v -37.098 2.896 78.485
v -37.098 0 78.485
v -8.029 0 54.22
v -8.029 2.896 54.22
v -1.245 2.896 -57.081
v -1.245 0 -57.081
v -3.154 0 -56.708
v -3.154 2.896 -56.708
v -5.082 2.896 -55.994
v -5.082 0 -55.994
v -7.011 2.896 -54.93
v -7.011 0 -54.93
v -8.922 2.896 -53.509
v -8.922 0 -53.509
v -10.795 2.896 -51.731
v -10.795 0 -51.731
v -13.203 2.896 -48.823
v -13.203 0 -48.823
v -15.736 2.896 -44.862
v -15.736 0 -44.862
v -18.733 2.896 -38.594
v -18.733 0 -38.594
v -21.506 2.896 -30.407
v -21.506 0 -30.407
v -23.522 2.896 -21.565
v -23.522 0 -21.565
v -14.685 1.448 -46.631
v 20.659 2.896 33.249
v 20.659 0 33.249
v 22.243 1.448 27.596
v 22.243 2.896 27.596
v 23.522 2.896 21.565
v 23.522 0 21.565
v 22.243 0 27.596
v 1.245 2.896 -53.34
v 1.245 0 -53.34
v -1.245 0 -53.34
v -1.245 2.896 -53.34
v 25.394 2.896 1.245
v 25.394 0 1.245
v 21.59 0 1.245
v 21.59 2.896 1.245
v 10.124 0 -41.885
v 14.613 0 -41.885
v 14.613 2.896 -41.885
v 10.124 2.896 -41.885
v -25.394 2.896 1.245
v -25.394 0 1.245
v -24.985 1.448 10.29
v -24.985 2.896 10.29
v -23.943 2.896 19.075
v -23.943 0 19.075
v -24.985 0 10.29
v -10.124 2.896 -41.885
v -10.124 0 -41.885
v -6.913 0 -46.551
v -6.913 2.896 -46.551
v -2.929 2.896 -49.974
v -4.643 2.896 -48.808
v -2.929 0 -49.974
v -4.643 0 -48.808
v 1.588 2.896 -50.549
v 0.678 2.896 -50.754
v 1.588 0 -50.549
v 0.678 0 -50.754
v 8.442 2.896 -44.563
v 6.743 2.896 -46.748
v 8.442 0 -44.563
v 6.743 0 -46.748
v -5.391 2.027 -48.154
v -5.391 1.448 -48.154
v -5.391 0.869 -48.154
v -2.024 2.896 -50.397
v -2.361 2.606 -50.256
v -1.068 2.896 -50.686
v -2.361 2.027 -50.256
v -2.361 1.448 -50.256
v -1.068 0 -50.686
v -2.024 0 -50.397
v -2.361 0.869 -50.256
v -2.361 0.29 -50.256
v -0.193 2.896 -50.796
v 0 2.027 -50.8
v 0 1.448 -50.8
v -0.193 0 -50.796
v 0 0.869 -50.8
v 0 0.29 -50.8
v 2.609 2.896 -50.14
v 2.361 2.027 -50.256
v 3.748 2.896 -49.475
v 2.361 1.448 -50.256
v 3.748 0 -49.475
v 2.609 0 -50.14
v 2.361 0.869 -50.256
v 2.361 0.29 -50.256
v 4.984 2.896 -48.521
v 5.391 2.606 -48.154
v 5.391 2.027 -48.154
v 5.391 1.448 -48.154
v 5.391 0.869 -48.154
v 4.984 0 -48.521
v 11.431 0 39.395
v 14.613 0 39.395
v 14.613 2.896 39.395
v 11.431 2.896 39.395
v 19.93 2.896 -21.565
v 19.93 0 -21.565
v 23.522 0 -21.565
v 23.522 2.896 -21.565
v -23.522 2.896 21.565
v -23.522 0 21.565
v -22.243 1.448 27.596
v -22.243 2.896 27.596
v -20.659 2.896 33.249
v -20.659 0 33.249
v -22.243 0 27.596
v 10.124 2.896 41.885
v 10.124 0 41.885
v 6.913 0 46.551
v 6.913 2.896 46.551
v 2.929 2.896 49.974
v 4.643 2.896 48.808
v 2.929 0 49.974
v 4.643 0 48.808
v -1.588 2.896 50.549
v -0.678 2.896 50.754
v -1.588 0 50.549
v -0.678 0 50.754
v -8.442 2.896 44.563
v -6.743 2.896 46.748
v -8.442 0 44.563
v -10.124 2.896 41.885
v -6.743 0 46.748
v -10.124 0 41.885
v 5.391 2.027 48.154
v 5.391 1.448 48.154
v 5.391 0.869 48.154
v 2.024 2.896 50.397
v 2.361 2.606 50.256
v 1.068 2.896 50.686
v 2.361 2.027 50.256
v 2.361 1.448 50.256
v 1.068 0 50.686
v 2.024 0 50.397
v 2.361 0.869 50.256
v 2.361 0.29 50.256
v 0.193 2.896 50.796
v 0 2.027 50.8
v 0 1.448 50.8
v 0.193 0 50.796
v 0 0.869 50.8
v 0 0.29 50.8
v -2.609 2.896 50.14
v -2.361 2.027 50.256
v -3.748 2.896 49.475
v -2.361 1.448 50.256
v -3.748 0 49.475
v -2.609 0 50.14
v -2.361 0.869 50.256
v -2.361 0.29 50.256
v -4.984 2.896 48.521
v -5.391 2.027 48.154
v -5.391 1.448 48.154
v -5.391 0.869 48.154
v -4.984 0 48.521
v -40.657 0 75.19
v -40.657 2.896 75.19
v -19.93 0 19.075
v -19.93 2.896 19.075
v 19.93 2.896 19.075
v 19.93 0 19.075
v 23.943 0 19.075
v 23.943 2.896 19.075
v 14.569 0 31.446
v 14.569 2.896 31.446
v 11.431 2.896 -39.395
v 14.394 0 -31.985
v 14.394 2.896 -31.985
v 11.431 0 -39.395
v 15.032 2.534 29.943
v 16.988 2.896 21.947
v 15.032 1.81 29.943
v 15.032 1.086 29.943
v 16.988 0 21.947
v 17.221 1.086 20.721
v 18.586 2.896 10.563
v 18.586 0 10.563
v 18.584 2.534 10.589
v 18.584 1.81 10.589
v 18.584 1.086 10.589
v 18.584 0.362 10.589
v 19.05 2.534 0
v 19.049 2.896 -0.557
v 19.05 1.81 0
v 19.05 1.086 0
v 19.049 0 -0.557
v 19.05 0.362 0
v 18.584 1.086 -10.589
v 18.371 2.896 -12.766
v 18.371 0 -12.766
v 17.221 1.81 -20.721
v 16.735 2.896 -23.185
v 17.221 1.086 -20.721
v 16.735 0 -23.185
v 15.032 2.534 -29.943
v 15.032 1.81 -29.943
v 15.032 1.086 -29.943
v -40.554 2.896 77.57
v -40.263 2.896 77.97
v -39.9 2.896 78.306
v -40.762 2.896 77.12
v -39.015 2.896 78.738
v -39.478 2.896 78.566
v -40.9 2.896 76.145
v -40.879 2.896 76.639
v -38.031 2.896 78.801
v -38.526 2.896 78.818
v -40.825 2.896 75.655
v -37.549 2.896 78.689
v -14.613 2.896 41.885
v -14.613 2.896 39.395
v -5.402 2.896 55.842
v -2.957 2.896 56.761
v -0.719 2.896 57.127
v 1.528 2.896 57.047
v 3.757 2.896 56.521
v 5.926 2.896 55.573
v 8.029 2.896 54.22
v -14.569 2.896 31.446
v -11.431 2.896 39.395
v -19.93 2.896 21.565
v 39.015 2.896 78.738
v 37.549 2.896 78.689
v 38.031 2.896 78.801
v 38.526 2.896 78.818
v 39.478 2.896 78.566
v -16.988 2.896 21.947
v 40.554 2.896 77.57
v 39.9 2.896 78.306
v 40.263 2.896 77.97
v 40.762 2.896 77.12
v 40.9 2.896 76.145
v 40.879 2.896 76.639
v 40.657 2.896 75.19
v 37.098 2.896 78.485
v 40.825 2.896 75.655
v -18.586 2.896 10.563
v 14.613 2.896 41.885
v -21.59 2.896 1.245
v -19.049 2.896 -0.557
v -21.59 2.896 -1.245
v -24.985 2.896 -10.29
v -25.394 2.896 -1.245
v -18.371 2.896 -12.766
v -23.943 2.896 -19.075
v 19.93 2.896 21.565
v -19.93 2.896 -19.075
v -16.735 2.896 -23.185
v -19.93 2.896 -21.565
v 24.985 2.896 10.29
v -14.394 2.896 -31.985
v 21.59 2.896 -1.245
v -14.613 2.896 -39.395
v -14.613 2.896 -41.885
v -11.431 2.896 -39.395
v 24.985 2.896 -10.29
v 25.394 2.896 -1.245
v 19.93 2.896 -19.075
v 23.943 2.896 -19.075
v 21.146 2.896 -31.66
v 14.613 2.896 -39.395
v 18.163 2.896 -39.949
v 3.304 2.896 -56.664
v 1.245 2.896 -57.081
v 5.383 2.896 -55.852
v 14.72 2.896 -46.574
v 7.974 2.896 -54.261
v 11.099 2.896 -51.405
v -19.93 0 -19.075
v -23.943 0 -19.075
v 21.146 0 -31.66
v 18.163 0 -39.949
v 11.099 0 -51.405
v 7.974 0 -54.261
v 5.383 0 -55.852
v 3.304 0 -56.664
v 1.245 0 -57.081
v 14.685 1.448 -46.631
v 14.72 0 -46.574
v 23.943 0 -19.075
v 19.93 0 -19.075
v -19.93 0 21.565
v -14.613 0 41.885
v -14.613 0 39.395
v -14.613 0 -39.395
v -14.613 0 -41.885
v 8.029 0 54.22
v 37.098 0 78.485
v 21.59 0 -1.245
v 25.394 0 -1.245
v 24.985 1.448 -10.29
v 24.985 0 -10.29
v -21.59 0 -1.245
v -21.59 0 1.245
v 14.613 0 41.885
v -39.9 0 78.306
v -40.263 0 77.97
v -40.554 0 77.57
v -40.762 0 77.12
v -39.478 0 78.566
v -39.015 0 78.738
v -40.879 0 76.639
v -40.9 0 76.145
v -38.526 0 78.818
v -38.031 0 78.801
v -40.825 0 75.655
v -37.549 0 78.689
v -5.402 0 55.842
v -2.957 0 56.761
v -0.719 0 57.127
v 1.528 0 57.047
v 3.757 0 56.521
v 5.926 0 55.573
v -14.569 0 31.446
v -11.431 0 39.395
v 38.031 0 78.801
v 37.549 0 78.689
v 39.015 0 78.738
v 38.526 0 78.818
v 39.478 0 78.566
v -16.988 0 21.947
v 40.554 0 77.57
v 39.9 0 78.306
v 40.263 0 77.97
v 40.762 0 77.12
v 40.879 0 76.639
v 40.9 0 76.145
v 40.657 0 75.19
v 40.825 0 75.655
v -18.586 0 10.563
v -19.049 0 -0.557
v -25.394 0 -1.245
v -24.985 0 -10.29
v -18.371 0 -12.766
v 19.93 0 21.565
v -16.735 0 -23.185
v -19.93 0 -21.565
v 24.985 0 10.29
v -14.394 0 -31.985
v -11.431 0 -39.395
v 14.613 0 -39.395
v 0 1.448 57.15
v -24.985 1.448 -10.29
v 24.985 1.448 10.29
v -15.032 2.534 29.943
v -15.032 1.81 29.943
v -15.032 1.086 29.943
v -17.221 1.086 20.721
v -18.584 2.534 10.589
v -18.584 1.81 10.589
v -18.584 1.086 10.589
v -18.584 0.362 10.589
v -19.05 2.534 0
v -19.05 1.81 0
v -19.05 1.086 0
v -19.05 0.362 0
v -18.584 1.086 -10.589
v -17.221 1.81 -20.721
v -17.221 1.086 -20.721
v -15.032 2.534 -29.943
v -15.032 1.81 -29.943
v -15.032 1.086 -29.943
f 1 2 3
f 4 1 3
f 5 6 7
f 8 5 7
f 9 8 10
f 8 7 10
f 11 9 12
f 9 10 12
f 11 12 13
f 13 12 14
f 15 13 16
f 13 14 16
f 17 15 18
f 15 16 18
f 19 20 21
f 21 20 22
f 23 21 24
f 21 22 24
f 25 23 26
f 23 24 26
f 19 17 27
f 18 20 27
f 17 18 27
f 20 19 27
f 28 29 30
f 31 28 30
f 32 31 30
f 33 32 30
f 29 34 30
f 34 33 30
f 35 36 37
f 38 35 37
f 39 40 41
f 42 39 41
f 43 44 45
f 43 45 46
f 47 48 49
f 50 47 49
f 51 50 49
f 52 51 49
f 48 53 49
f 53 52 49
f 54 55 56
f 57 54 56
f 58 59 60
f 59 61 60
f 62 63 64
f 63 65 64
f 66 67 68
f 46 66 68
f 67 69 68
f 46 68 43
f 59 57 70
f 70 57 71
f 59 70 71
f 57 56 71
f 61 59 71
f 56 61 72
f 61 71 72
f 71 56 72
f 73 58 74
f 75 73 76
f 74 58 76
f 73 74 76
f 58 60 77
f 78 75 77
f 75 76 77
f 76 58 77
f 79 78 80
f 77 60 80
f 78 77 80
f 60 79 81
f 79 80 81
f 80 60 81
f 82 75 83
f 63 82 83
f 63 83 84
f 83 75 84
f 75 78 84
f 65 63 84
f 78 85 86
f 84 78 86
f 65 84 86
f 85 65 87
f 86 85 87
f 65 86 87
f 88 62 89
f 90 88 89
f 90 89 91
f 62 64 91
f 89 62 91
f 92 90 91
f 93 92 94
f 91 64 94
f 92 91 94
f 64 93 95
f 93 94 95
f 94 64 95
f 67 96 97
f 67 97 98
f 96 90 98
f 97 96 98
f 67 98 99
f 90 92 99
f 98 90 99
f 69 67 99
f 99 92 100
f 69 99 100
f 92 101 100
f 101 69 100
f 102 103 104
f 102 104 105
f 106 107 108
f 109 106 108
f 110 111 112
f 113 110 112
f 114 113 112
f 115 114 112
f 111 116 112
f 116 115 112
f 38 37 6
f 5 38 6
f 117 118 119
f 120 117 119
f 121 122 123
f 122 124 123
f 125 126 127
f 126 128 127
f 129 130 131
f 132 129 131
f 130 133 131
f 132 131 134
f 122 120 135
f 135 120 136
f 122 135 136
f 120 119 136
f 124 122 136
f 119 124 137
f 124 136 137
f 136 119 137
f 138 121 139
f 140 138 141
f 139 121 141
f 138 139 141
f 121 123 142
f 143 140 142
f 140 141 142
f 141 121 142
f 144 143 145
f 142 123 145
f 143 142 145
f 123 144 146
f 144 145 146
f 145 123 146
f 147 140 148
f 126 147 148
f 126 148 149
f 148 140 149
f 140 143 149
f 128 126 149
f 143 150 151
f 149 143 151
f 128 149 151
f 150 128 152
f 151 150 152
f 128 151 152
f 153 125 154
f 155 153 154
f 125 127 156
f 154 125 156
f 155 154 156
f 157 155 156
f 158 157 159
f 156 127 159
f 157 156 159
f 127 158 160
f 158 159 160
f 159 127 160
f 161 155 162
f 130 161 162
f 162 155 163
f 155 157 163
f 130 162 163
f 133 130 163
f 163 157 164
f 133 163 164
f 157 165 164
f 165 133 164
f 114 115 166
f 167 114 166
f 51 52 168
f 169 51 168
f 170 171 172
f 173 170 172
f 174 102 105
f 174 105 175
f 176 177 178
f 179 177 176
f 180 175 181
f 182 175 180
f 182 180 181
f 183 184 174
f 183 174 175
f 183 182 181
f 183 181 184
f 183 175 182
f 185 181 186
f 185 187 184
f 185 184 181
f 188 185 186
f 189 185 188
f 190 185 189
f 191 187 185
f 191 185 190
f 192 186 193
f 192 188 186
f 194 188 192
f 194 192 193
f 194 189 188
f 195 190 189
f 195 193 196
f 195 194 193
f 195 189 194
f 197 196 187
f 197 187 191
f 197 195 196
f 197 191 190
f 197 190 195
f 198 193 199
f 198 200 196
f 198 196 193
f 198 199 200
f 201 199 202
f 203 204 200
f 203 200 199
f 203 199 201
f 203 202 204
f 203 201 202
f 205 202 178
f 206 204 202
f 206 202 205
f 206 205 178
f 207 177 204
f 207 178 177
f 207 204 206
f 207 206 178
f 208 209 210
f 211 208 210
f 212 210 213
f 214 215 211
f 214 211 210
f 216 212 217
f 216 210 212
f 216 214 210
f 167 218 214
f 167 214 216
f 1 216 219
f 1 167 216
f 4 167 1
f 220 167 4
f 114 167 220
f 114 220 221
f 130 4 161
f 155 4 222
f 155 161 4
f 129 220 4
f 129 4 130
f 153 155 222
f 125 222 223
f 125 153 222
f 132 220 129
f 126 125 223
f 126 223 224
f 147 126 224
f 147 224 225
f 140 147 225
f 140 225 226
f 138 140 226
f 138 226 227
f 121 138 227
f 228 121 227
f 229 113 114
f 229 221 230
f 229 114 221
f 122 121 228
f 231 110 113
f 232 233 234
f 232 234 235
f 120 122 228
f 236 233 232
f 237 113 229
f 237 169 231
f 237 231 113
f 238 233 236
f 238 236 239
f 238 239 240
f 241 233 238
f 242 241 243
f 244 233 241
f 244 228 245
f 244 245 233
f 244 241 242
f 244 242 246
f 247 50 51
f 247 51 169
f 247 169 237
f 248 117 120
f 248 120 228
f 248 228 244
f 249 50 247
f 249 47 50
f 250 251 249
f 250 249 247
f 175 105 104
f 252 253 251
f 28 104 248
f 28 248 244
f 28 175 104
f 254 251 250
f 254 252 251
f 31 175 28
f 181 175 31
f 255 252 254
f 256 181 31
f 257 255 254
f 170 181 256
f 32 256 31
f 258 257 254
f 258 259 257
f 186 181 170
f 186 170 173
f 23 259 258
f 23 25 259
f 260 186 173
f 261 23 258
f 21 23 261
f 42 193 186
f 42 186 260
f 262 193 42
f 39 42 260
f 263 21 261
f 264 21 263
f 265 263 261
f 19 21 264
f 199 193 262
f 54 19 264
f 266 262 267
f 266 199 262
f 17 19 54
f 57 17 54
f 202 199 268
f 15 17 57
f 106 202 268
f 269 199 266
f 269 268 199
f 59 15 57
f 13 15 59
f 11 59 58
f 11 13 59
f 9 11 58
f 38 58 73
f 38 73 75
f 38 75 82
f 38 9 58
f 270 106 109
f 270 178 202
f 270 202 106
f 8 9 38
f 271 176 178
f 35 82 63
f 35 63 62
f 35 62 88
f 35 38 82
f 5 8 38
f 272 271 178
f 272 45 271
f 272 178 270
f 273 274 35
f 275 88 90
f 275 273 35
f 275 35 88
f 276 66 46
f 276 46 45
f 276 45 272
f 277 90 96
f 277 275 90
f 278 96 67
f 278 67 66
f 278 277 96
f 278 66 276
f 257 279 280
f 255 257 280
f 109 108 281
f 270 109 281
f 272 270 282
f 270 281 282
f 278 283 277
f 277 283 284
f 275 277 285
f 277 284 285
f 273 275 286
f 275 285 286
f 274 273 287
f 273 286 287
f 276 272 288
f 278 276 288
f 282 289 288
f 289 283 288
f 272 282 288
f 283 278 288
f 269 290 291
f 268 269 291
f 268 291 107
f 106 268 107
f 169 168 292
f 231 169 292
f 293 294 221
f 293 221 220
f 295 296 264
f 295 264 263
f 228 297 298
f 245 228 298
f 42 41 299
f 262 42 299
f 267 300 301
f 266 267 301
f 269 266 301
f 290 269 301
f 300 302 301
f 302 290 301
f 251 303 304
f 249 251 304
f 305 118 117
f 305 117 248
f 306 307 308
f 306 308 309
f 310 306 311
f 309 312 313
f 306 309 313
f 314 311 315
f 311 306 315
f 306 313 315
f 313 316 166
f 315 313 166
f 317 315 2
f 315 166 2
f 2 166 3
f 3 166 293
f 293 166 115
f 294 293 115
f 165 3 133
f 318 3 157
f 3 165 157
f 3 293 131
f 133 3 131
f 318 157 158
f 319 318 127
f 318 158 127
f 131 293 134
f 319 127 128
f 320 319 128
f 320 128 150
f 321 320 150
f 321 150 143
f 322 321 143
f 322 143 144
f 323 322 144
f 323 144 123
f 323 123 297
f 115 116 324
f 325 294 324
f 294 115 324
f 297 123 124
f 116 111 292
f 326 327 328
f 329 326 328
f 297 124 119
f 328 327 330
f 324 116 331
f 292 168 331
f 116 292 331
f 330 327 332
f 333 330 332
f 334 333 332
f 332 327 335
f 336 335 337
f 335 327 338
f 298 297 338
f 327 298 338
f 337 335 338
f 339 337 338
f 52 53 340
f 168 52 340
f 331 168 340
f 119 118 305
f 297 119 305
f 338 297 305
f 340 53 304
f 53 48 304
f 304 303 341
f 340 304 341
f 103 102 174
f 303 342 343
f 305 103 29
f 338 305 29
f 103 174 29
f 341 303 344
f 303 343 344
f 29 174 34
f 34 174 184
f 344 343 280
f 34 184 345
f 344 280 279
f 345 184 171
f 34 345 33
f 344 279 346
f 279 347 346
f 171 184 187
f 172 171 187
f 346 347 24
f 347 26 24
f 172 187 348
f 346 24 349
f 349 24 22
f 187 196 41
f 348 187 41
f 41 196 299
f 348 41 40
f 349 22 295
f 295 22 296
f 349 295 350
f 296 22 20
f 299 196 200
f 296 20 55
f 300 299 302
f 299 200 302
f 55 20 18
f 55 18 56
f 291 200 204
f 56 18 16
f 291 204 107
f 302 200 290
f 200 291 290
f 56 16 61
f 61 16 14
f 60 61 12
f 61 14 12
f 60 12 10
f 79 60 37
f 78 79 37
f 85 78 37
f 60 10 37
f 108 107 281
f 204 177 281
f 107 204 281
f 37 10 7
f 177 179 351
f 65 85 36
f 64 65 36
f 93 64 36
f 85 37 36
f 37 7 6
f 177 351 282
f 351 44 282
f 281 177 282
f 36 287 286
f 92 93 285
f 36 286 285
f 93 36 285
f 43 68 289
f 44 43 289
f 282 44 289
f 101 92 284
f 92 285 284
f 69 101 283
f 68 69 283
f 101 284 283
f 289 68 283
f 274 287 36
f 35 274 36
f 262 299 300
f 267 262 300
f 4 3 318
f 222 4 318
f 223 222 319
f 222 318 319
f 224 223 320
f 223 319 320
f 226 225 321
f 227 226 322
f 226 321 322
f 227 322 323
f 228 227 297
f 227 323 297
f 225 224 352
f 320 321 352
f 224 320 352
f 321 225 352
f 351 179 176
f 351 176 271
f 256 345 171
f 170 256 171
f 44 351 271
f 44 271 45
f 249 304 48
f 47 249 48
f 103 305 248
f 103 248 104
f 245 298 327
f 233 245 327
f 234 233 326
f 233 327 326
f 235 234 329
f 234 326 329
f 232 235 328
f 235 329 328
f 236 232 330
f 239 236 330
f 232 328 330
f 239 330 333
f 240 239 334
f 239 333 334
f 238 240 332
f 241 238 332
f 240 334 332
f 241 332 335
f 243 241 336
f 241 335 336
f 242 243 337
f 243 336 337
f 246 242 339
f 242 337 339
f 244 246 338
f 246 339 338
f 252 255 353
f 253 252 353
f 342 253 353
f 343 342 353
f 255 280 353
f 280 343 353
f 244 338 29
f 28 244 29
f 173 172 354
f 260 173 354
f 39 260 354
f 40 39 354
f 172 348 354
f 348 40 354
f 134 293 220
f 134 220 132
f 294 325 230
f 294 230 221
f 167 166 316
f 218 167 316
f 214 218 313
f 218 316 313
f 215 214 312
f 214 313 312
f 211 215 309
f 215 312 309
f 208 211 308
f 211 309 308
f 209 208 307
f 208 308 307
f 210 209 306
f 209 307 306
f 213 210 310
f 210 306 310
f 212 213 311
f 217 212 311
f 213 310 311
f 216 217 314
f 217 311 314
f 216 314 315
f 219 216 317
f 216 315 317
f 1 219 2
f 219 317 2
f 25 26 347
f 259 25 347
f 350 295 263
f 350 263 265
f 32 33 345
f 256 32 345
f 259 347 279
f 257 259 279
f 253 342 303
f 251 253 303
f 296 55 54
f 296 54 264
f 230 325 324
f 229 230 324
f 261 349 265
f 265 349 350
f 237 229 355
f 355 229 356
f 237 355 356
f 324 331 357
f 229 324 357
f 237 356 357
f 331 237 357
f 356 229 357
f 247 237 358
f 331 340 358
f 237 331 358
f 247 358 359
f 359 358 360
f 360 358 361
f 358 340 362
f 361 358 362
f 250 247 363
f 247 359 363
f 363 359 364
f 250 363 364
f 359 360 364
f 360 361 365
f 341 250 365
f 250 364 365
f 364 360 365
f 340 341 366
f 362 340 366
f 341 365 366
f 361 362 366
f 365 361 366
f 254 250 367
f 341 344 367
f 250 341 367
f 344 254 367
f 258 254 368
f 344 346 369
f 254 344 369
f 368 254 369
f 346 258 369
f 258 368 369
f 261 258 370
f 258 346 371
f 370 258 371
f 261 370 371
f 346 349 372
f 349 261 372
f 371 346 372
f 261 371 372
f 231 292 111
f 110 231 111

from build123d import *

# Parameters (mm, degrees)
BOSS_EXTRUDE2_DEPTH = 2.8956


with BuildPart() as part:
    # Sketch1 → Boss-Extrude2 (new body)
    with BuildSketch(Plane(origin=(0, 0, 0), x_dir=(1, 0, 0), z_dir=(0, 1, 0))):
        with BuildLine():
            Line((21.59, 1.2446), (25.393976036, 1.2446))
            add(Edge.make_bspline(
                [(25.393976036, 1.2446), (25.305125525, 10.422131382), (23.943355437, 19.0754)],
                knots=[4.73416848, 4.73416848, 4.73416848, 5.052697334, 5.052697334, 5.052697334], degree=2, weights=[1, 0.987344206, 1]))
            Line((23.943355437, 19.0754), (19.930240776, 19.0754))
            Line((19.930240776, 19.0754), (19.930240776, 21.5646))
            Line((19.930240776, 21.5646), (23.522368768, 21.5646))
            add(Edge.make_bspline(
                [(23.522368768, 21.5646), (17.413838434, 55.296547713), (1.2446, 57.081350193)],
                knots=[5.099304053, 5.099304053, 5.099304053, 6.234165678, 6.234165678, 6.234165678], degree=2, weights=[1, 0.843284611, 1]))
            Line((1.2446, 57.081350193), (1.2446, 53.34))
            Line((1.2446, 53.34), (-1.2446, 53.34))
            Line((-1.2446, 53.34), (-1.2446, 57.081350193))
            add(Edge.make_bspline(
                [(-1.2446, 57.081350193), (-17.413838434, 55.296547713), (-23.522368768, 21.5646)],
                knots=[0.049019629, 0.049019629, 0.049019629, 1.183881254, 1.183881254, 1.183881254], degree=2, weights=[1, 0.843284611, 1]))
            Line((-23.522368768, 21.5646), (-19.930240776, 21.5646))
            Line((-19.930240776, 21.5646), (-19.930240776, 19.0754))
            Line((-19.930240776, 19.0754), (-23.943355437, 19.0754))
            add(Edge.make_bspline(
                [(-23.943355437, 19.0754), (-25.305125525, 10.422131382), (-25.393976036, 1.2446)],
                knots=[1.230487974, 1.230487974, 1.230487974, 1.549016827, 1.549016827, 1.549016827], degree=2, weights=[1, 0.987344206, 1]))
            Line((-25.393976036, 1.2446), (-21.59, 1.2446))
            Line((-21.59, 1.2446), (-21.59, -1.2446))
            Line((-21.59, -1.2446), (-25.393976036, -1.2446))
            add(Edge.make_bspline(
                [(-25.393976036, -1.2446), (-25.305125525, -10.422131382), (-23.943355437, -19.0754)],
                knots=[1.592575826, 1.592575826, 1.592575826, 1.91110468, 1.91110468, 1.91110468], degree=2, weights=[1, 0.987344206, 1]))
            Line((-23.943355437, -19.0754), (-19.930240776, -19.0754))
            Line((-19.930240776, -19.0754), (-19.930240776, -21.5646))
            Line((-19.930240776, -21.5646), (-23.522368768, -21.5646))
            add(Edge.make_bspline(
                [(-23.522368768, -21.5646), (-22.395811131, -27.785569894), (-20.658836503, -33.249220312)],
                knots=[1.957711399, 1.957711399, 1.957711399, 2.191722412, 2.191722412, 2.191722412], degree=2, weights=[1, 0.993162662, 1]))
            Line((-20.658836503, -33.249220312), (-40.656934115, -75.189915873))
            ThreePointArc((-40.656934115, -75.189915873), (-40.089838211, -78.146952179), (-37.097948163, -78.484969079))
            Line((-37.097948163, -78.484969079), (-8.029094451, -54.219568092))
            add(Edge.make_bspline(
                [(-8.029094451, -54.219568092), (0, -60.238814416), (8.029094451, -54.219568092)],
                knots=[2.819970364, 2.819970364, 2.819970364, 3.463214943, 3.463214943, 3.463214943], degree=2, weights=[1, 0.948723851, 1]))
            Line((8.029094451, -54.219568092), (37.097948163, -78.484969079))
            ThreePointArc((37.097948163, -78.484969079), (40.089838211, -78.146952179), (40.656934115, -75.189915873))
            Line((40.656934115, -75.189915873), (20.658836503, -33.249220312))
            add(Edge.make_bspline(
                [(20.658836503, -33.249220312), (22.395811131, -27.785569894), (23.522368768, -21.5646)],
                knots=[4.091462895, 4.091462895, 4.091462895, 4.325473908, 4.325473908, 4.325473908], degree=2, weights=[1, 0.993162662, 1]))
            Line((23.522368768, -21.5646), (19.930240776, -21.5646))
            Line((19.930240776, -21.5646), (19.930240776, -19.0754))
            Line((19.930240776, -19.0754), (23.943355437, -19.0754))
            add(Edge.make_bspline(
                [(23.943355437, -19.0754), (25.305125525, -10.422131382), (25.393976036, -1.2446)],
                knots=[4.372080627, 4.372080627, 4.372080627, 4.690609481, 4.690609481, 4.690609481], degree=2, weights=[1, 0.987344206, 1]))
            Line((25.393976036, -1.2446), (21.59, -1.2446))
            Line((21.59, -1.2446), (21.59, 1.2446))
        make_face()
        with BuildLine():
            Line((-14.613224312, -41.884600001), (-10.124198394, -41.884600001))
            add(Edge.make_bspline(
                [(0, -50.8), (-0.374242122, -50.8), (-1.087449753, -50.722280744), (-2.740425126, -50.190283538), (-5.318112389, -48.514264833), (-8.117471478, -45.20633596), (-9.696301311, -42.637606864), (-10.124198394, -41.884600001)],
                knots=[-3.141592654, -3.141592654, -3.141592654, -3.141592654, -3.043417883, -2.945243113, -2.748893572, -2.552544031, -2.478028469, -2.478028469, -2.478028469, -2.478028469], degree=3))
            add(Edge.make_bspline(
                [(0, -50.8), (0.374242122, -50.8), (1.087449753, -50.722280744), (2.740425126, -50.190283538), (5.318112389, -48.514264833), (8.117471478, -45.20633596), (9.696301311, -42.637606864), (10.124198394, -41.884600001)],
                knots=[-3.141592654, -3.141592654, -3.141592654, -3.141592654, -3.043417883, -2.945243113, -2.748893572, -2.552544031, -2.478028469, -2.478028469, -2.478028469, -2.478028469], degree=3))
            Line((10.124198394, -41.884600001), (14.613224312, -41.884600001))
            Line((14.613224312, -41.884600001), (14.613224312, -39.395400001))
            Line((14.613224312, -39.395400001), (11.431305901, -39.395400001))
            add(Edge.make_bspline(
                [(11.431305901, -39.395400001), (11.677149239, -38.889598832), (12.987812642, -36.070874709), (15.148196965, -30.166196648), (18.099752632, -17.775460251), (19.683498245, 0), (18.099752632, 17.775460251), (15.148196965, 30.166196648), (12.987812642, 36.070874709), (11.677149239, 38.889598832), (11.431305901, 39.395400001)],
                knots=[-2.400745736, -2.400745736, -2.400745736, -2.400745736, -2.35619449, -2.159844949, -1.963495408, -1.570796327, -1.178097245, -0.981747704, -0.785398163, -0.740846918, -0.740846918, -0.740846918, -0.740846918], degree=3))
            Line((11.431305901, 39.395400001), (14.613224312, 39.395400001))
            Line((14.613224312, 39.395400001), (14.613224312, 41.884600001))
            Line((14.613224312, 41.884600001), (10.124198394, 41.884600001))
            add(Edge.make_bspline(
                [(10.124198394, 41.884600001), (9.696301311, 42.637606864), (8.117471478, 45.20633596), (5.318112389, 48.514264833), (2.740425126, 50.190283538), (1.087449753, 50.722280744), (0.374242122, 50.8), (0, 50.8)],
                knots=[-0.663564185, -0.663564185, -0.663564185, -0.663564185, -0.589048623, -0.392699082, -0.196349541, -0.09817477, 0, 0, 0, 0], degree=3))
            add(Edge.make_bspline(
                [(-10.124198394, 41.884600001), (-9.696301311, 42.637606864), (-8.117471478, 45.20633596), (-5.318112389, 48.514264833), (-2.740425126, 50.190283538), (-1.087449753, 50.722280744), (-0.374242122, 50.8), (0, 50.8)],
                knots=[-0.663564185, -0.663564185, -0.663564185, -0.663564185, -0.589048623, -0.392699082, -0.196349541, -0.09817477, 0, 0, 0, 0], degree=3))
            Line((-10.124198394, 41.884600001), (-14.613224312, 41.884600001))
            Line((-14.613224312, 41.884600001), (-14.613224312, 39.395400001))
            Line((-14.613224312, 39.395400001), (-11.431305901, 39.395400001))
            add(Edge.make_bspline(
                [(-11.431305901, -39.395400001), (-11.677149239, -38.889598832), (-12.987812642, -36.070874709), (-15.148196965, -30.166196648), (-18.099752632, -17.775460251), (-19.683498245, 0), (-18.099752632, 17.775460251), (-15.148196965, 30.166196648), (-12.987812642, 36.070874709), (-11.677149239, 38.889598832), (-11.431305901, 39.395400001)],
                knots=[-2.400745736, -2.400745736, -2.400745736, -2.400745736, -2.35619449, -2.159844949, -1.963495408, -1.570796327, -1.178097245, -0.981747704, -0.785398163, -0.740846918, -0.740846918, -0.740846918, -0.740846918], degree=3))
            Line((-11.431305901, -39.395400001), (-14.613224312, -39.395400001))
            Line((-14.613224312, -39.395400001), (-14.613224312, -41.884600001))
        make_face(mode=Mode.SUBTRACT)
    extrude(amount=BOSS_EXTRUDE2_DEPTH)


solid = part.part
